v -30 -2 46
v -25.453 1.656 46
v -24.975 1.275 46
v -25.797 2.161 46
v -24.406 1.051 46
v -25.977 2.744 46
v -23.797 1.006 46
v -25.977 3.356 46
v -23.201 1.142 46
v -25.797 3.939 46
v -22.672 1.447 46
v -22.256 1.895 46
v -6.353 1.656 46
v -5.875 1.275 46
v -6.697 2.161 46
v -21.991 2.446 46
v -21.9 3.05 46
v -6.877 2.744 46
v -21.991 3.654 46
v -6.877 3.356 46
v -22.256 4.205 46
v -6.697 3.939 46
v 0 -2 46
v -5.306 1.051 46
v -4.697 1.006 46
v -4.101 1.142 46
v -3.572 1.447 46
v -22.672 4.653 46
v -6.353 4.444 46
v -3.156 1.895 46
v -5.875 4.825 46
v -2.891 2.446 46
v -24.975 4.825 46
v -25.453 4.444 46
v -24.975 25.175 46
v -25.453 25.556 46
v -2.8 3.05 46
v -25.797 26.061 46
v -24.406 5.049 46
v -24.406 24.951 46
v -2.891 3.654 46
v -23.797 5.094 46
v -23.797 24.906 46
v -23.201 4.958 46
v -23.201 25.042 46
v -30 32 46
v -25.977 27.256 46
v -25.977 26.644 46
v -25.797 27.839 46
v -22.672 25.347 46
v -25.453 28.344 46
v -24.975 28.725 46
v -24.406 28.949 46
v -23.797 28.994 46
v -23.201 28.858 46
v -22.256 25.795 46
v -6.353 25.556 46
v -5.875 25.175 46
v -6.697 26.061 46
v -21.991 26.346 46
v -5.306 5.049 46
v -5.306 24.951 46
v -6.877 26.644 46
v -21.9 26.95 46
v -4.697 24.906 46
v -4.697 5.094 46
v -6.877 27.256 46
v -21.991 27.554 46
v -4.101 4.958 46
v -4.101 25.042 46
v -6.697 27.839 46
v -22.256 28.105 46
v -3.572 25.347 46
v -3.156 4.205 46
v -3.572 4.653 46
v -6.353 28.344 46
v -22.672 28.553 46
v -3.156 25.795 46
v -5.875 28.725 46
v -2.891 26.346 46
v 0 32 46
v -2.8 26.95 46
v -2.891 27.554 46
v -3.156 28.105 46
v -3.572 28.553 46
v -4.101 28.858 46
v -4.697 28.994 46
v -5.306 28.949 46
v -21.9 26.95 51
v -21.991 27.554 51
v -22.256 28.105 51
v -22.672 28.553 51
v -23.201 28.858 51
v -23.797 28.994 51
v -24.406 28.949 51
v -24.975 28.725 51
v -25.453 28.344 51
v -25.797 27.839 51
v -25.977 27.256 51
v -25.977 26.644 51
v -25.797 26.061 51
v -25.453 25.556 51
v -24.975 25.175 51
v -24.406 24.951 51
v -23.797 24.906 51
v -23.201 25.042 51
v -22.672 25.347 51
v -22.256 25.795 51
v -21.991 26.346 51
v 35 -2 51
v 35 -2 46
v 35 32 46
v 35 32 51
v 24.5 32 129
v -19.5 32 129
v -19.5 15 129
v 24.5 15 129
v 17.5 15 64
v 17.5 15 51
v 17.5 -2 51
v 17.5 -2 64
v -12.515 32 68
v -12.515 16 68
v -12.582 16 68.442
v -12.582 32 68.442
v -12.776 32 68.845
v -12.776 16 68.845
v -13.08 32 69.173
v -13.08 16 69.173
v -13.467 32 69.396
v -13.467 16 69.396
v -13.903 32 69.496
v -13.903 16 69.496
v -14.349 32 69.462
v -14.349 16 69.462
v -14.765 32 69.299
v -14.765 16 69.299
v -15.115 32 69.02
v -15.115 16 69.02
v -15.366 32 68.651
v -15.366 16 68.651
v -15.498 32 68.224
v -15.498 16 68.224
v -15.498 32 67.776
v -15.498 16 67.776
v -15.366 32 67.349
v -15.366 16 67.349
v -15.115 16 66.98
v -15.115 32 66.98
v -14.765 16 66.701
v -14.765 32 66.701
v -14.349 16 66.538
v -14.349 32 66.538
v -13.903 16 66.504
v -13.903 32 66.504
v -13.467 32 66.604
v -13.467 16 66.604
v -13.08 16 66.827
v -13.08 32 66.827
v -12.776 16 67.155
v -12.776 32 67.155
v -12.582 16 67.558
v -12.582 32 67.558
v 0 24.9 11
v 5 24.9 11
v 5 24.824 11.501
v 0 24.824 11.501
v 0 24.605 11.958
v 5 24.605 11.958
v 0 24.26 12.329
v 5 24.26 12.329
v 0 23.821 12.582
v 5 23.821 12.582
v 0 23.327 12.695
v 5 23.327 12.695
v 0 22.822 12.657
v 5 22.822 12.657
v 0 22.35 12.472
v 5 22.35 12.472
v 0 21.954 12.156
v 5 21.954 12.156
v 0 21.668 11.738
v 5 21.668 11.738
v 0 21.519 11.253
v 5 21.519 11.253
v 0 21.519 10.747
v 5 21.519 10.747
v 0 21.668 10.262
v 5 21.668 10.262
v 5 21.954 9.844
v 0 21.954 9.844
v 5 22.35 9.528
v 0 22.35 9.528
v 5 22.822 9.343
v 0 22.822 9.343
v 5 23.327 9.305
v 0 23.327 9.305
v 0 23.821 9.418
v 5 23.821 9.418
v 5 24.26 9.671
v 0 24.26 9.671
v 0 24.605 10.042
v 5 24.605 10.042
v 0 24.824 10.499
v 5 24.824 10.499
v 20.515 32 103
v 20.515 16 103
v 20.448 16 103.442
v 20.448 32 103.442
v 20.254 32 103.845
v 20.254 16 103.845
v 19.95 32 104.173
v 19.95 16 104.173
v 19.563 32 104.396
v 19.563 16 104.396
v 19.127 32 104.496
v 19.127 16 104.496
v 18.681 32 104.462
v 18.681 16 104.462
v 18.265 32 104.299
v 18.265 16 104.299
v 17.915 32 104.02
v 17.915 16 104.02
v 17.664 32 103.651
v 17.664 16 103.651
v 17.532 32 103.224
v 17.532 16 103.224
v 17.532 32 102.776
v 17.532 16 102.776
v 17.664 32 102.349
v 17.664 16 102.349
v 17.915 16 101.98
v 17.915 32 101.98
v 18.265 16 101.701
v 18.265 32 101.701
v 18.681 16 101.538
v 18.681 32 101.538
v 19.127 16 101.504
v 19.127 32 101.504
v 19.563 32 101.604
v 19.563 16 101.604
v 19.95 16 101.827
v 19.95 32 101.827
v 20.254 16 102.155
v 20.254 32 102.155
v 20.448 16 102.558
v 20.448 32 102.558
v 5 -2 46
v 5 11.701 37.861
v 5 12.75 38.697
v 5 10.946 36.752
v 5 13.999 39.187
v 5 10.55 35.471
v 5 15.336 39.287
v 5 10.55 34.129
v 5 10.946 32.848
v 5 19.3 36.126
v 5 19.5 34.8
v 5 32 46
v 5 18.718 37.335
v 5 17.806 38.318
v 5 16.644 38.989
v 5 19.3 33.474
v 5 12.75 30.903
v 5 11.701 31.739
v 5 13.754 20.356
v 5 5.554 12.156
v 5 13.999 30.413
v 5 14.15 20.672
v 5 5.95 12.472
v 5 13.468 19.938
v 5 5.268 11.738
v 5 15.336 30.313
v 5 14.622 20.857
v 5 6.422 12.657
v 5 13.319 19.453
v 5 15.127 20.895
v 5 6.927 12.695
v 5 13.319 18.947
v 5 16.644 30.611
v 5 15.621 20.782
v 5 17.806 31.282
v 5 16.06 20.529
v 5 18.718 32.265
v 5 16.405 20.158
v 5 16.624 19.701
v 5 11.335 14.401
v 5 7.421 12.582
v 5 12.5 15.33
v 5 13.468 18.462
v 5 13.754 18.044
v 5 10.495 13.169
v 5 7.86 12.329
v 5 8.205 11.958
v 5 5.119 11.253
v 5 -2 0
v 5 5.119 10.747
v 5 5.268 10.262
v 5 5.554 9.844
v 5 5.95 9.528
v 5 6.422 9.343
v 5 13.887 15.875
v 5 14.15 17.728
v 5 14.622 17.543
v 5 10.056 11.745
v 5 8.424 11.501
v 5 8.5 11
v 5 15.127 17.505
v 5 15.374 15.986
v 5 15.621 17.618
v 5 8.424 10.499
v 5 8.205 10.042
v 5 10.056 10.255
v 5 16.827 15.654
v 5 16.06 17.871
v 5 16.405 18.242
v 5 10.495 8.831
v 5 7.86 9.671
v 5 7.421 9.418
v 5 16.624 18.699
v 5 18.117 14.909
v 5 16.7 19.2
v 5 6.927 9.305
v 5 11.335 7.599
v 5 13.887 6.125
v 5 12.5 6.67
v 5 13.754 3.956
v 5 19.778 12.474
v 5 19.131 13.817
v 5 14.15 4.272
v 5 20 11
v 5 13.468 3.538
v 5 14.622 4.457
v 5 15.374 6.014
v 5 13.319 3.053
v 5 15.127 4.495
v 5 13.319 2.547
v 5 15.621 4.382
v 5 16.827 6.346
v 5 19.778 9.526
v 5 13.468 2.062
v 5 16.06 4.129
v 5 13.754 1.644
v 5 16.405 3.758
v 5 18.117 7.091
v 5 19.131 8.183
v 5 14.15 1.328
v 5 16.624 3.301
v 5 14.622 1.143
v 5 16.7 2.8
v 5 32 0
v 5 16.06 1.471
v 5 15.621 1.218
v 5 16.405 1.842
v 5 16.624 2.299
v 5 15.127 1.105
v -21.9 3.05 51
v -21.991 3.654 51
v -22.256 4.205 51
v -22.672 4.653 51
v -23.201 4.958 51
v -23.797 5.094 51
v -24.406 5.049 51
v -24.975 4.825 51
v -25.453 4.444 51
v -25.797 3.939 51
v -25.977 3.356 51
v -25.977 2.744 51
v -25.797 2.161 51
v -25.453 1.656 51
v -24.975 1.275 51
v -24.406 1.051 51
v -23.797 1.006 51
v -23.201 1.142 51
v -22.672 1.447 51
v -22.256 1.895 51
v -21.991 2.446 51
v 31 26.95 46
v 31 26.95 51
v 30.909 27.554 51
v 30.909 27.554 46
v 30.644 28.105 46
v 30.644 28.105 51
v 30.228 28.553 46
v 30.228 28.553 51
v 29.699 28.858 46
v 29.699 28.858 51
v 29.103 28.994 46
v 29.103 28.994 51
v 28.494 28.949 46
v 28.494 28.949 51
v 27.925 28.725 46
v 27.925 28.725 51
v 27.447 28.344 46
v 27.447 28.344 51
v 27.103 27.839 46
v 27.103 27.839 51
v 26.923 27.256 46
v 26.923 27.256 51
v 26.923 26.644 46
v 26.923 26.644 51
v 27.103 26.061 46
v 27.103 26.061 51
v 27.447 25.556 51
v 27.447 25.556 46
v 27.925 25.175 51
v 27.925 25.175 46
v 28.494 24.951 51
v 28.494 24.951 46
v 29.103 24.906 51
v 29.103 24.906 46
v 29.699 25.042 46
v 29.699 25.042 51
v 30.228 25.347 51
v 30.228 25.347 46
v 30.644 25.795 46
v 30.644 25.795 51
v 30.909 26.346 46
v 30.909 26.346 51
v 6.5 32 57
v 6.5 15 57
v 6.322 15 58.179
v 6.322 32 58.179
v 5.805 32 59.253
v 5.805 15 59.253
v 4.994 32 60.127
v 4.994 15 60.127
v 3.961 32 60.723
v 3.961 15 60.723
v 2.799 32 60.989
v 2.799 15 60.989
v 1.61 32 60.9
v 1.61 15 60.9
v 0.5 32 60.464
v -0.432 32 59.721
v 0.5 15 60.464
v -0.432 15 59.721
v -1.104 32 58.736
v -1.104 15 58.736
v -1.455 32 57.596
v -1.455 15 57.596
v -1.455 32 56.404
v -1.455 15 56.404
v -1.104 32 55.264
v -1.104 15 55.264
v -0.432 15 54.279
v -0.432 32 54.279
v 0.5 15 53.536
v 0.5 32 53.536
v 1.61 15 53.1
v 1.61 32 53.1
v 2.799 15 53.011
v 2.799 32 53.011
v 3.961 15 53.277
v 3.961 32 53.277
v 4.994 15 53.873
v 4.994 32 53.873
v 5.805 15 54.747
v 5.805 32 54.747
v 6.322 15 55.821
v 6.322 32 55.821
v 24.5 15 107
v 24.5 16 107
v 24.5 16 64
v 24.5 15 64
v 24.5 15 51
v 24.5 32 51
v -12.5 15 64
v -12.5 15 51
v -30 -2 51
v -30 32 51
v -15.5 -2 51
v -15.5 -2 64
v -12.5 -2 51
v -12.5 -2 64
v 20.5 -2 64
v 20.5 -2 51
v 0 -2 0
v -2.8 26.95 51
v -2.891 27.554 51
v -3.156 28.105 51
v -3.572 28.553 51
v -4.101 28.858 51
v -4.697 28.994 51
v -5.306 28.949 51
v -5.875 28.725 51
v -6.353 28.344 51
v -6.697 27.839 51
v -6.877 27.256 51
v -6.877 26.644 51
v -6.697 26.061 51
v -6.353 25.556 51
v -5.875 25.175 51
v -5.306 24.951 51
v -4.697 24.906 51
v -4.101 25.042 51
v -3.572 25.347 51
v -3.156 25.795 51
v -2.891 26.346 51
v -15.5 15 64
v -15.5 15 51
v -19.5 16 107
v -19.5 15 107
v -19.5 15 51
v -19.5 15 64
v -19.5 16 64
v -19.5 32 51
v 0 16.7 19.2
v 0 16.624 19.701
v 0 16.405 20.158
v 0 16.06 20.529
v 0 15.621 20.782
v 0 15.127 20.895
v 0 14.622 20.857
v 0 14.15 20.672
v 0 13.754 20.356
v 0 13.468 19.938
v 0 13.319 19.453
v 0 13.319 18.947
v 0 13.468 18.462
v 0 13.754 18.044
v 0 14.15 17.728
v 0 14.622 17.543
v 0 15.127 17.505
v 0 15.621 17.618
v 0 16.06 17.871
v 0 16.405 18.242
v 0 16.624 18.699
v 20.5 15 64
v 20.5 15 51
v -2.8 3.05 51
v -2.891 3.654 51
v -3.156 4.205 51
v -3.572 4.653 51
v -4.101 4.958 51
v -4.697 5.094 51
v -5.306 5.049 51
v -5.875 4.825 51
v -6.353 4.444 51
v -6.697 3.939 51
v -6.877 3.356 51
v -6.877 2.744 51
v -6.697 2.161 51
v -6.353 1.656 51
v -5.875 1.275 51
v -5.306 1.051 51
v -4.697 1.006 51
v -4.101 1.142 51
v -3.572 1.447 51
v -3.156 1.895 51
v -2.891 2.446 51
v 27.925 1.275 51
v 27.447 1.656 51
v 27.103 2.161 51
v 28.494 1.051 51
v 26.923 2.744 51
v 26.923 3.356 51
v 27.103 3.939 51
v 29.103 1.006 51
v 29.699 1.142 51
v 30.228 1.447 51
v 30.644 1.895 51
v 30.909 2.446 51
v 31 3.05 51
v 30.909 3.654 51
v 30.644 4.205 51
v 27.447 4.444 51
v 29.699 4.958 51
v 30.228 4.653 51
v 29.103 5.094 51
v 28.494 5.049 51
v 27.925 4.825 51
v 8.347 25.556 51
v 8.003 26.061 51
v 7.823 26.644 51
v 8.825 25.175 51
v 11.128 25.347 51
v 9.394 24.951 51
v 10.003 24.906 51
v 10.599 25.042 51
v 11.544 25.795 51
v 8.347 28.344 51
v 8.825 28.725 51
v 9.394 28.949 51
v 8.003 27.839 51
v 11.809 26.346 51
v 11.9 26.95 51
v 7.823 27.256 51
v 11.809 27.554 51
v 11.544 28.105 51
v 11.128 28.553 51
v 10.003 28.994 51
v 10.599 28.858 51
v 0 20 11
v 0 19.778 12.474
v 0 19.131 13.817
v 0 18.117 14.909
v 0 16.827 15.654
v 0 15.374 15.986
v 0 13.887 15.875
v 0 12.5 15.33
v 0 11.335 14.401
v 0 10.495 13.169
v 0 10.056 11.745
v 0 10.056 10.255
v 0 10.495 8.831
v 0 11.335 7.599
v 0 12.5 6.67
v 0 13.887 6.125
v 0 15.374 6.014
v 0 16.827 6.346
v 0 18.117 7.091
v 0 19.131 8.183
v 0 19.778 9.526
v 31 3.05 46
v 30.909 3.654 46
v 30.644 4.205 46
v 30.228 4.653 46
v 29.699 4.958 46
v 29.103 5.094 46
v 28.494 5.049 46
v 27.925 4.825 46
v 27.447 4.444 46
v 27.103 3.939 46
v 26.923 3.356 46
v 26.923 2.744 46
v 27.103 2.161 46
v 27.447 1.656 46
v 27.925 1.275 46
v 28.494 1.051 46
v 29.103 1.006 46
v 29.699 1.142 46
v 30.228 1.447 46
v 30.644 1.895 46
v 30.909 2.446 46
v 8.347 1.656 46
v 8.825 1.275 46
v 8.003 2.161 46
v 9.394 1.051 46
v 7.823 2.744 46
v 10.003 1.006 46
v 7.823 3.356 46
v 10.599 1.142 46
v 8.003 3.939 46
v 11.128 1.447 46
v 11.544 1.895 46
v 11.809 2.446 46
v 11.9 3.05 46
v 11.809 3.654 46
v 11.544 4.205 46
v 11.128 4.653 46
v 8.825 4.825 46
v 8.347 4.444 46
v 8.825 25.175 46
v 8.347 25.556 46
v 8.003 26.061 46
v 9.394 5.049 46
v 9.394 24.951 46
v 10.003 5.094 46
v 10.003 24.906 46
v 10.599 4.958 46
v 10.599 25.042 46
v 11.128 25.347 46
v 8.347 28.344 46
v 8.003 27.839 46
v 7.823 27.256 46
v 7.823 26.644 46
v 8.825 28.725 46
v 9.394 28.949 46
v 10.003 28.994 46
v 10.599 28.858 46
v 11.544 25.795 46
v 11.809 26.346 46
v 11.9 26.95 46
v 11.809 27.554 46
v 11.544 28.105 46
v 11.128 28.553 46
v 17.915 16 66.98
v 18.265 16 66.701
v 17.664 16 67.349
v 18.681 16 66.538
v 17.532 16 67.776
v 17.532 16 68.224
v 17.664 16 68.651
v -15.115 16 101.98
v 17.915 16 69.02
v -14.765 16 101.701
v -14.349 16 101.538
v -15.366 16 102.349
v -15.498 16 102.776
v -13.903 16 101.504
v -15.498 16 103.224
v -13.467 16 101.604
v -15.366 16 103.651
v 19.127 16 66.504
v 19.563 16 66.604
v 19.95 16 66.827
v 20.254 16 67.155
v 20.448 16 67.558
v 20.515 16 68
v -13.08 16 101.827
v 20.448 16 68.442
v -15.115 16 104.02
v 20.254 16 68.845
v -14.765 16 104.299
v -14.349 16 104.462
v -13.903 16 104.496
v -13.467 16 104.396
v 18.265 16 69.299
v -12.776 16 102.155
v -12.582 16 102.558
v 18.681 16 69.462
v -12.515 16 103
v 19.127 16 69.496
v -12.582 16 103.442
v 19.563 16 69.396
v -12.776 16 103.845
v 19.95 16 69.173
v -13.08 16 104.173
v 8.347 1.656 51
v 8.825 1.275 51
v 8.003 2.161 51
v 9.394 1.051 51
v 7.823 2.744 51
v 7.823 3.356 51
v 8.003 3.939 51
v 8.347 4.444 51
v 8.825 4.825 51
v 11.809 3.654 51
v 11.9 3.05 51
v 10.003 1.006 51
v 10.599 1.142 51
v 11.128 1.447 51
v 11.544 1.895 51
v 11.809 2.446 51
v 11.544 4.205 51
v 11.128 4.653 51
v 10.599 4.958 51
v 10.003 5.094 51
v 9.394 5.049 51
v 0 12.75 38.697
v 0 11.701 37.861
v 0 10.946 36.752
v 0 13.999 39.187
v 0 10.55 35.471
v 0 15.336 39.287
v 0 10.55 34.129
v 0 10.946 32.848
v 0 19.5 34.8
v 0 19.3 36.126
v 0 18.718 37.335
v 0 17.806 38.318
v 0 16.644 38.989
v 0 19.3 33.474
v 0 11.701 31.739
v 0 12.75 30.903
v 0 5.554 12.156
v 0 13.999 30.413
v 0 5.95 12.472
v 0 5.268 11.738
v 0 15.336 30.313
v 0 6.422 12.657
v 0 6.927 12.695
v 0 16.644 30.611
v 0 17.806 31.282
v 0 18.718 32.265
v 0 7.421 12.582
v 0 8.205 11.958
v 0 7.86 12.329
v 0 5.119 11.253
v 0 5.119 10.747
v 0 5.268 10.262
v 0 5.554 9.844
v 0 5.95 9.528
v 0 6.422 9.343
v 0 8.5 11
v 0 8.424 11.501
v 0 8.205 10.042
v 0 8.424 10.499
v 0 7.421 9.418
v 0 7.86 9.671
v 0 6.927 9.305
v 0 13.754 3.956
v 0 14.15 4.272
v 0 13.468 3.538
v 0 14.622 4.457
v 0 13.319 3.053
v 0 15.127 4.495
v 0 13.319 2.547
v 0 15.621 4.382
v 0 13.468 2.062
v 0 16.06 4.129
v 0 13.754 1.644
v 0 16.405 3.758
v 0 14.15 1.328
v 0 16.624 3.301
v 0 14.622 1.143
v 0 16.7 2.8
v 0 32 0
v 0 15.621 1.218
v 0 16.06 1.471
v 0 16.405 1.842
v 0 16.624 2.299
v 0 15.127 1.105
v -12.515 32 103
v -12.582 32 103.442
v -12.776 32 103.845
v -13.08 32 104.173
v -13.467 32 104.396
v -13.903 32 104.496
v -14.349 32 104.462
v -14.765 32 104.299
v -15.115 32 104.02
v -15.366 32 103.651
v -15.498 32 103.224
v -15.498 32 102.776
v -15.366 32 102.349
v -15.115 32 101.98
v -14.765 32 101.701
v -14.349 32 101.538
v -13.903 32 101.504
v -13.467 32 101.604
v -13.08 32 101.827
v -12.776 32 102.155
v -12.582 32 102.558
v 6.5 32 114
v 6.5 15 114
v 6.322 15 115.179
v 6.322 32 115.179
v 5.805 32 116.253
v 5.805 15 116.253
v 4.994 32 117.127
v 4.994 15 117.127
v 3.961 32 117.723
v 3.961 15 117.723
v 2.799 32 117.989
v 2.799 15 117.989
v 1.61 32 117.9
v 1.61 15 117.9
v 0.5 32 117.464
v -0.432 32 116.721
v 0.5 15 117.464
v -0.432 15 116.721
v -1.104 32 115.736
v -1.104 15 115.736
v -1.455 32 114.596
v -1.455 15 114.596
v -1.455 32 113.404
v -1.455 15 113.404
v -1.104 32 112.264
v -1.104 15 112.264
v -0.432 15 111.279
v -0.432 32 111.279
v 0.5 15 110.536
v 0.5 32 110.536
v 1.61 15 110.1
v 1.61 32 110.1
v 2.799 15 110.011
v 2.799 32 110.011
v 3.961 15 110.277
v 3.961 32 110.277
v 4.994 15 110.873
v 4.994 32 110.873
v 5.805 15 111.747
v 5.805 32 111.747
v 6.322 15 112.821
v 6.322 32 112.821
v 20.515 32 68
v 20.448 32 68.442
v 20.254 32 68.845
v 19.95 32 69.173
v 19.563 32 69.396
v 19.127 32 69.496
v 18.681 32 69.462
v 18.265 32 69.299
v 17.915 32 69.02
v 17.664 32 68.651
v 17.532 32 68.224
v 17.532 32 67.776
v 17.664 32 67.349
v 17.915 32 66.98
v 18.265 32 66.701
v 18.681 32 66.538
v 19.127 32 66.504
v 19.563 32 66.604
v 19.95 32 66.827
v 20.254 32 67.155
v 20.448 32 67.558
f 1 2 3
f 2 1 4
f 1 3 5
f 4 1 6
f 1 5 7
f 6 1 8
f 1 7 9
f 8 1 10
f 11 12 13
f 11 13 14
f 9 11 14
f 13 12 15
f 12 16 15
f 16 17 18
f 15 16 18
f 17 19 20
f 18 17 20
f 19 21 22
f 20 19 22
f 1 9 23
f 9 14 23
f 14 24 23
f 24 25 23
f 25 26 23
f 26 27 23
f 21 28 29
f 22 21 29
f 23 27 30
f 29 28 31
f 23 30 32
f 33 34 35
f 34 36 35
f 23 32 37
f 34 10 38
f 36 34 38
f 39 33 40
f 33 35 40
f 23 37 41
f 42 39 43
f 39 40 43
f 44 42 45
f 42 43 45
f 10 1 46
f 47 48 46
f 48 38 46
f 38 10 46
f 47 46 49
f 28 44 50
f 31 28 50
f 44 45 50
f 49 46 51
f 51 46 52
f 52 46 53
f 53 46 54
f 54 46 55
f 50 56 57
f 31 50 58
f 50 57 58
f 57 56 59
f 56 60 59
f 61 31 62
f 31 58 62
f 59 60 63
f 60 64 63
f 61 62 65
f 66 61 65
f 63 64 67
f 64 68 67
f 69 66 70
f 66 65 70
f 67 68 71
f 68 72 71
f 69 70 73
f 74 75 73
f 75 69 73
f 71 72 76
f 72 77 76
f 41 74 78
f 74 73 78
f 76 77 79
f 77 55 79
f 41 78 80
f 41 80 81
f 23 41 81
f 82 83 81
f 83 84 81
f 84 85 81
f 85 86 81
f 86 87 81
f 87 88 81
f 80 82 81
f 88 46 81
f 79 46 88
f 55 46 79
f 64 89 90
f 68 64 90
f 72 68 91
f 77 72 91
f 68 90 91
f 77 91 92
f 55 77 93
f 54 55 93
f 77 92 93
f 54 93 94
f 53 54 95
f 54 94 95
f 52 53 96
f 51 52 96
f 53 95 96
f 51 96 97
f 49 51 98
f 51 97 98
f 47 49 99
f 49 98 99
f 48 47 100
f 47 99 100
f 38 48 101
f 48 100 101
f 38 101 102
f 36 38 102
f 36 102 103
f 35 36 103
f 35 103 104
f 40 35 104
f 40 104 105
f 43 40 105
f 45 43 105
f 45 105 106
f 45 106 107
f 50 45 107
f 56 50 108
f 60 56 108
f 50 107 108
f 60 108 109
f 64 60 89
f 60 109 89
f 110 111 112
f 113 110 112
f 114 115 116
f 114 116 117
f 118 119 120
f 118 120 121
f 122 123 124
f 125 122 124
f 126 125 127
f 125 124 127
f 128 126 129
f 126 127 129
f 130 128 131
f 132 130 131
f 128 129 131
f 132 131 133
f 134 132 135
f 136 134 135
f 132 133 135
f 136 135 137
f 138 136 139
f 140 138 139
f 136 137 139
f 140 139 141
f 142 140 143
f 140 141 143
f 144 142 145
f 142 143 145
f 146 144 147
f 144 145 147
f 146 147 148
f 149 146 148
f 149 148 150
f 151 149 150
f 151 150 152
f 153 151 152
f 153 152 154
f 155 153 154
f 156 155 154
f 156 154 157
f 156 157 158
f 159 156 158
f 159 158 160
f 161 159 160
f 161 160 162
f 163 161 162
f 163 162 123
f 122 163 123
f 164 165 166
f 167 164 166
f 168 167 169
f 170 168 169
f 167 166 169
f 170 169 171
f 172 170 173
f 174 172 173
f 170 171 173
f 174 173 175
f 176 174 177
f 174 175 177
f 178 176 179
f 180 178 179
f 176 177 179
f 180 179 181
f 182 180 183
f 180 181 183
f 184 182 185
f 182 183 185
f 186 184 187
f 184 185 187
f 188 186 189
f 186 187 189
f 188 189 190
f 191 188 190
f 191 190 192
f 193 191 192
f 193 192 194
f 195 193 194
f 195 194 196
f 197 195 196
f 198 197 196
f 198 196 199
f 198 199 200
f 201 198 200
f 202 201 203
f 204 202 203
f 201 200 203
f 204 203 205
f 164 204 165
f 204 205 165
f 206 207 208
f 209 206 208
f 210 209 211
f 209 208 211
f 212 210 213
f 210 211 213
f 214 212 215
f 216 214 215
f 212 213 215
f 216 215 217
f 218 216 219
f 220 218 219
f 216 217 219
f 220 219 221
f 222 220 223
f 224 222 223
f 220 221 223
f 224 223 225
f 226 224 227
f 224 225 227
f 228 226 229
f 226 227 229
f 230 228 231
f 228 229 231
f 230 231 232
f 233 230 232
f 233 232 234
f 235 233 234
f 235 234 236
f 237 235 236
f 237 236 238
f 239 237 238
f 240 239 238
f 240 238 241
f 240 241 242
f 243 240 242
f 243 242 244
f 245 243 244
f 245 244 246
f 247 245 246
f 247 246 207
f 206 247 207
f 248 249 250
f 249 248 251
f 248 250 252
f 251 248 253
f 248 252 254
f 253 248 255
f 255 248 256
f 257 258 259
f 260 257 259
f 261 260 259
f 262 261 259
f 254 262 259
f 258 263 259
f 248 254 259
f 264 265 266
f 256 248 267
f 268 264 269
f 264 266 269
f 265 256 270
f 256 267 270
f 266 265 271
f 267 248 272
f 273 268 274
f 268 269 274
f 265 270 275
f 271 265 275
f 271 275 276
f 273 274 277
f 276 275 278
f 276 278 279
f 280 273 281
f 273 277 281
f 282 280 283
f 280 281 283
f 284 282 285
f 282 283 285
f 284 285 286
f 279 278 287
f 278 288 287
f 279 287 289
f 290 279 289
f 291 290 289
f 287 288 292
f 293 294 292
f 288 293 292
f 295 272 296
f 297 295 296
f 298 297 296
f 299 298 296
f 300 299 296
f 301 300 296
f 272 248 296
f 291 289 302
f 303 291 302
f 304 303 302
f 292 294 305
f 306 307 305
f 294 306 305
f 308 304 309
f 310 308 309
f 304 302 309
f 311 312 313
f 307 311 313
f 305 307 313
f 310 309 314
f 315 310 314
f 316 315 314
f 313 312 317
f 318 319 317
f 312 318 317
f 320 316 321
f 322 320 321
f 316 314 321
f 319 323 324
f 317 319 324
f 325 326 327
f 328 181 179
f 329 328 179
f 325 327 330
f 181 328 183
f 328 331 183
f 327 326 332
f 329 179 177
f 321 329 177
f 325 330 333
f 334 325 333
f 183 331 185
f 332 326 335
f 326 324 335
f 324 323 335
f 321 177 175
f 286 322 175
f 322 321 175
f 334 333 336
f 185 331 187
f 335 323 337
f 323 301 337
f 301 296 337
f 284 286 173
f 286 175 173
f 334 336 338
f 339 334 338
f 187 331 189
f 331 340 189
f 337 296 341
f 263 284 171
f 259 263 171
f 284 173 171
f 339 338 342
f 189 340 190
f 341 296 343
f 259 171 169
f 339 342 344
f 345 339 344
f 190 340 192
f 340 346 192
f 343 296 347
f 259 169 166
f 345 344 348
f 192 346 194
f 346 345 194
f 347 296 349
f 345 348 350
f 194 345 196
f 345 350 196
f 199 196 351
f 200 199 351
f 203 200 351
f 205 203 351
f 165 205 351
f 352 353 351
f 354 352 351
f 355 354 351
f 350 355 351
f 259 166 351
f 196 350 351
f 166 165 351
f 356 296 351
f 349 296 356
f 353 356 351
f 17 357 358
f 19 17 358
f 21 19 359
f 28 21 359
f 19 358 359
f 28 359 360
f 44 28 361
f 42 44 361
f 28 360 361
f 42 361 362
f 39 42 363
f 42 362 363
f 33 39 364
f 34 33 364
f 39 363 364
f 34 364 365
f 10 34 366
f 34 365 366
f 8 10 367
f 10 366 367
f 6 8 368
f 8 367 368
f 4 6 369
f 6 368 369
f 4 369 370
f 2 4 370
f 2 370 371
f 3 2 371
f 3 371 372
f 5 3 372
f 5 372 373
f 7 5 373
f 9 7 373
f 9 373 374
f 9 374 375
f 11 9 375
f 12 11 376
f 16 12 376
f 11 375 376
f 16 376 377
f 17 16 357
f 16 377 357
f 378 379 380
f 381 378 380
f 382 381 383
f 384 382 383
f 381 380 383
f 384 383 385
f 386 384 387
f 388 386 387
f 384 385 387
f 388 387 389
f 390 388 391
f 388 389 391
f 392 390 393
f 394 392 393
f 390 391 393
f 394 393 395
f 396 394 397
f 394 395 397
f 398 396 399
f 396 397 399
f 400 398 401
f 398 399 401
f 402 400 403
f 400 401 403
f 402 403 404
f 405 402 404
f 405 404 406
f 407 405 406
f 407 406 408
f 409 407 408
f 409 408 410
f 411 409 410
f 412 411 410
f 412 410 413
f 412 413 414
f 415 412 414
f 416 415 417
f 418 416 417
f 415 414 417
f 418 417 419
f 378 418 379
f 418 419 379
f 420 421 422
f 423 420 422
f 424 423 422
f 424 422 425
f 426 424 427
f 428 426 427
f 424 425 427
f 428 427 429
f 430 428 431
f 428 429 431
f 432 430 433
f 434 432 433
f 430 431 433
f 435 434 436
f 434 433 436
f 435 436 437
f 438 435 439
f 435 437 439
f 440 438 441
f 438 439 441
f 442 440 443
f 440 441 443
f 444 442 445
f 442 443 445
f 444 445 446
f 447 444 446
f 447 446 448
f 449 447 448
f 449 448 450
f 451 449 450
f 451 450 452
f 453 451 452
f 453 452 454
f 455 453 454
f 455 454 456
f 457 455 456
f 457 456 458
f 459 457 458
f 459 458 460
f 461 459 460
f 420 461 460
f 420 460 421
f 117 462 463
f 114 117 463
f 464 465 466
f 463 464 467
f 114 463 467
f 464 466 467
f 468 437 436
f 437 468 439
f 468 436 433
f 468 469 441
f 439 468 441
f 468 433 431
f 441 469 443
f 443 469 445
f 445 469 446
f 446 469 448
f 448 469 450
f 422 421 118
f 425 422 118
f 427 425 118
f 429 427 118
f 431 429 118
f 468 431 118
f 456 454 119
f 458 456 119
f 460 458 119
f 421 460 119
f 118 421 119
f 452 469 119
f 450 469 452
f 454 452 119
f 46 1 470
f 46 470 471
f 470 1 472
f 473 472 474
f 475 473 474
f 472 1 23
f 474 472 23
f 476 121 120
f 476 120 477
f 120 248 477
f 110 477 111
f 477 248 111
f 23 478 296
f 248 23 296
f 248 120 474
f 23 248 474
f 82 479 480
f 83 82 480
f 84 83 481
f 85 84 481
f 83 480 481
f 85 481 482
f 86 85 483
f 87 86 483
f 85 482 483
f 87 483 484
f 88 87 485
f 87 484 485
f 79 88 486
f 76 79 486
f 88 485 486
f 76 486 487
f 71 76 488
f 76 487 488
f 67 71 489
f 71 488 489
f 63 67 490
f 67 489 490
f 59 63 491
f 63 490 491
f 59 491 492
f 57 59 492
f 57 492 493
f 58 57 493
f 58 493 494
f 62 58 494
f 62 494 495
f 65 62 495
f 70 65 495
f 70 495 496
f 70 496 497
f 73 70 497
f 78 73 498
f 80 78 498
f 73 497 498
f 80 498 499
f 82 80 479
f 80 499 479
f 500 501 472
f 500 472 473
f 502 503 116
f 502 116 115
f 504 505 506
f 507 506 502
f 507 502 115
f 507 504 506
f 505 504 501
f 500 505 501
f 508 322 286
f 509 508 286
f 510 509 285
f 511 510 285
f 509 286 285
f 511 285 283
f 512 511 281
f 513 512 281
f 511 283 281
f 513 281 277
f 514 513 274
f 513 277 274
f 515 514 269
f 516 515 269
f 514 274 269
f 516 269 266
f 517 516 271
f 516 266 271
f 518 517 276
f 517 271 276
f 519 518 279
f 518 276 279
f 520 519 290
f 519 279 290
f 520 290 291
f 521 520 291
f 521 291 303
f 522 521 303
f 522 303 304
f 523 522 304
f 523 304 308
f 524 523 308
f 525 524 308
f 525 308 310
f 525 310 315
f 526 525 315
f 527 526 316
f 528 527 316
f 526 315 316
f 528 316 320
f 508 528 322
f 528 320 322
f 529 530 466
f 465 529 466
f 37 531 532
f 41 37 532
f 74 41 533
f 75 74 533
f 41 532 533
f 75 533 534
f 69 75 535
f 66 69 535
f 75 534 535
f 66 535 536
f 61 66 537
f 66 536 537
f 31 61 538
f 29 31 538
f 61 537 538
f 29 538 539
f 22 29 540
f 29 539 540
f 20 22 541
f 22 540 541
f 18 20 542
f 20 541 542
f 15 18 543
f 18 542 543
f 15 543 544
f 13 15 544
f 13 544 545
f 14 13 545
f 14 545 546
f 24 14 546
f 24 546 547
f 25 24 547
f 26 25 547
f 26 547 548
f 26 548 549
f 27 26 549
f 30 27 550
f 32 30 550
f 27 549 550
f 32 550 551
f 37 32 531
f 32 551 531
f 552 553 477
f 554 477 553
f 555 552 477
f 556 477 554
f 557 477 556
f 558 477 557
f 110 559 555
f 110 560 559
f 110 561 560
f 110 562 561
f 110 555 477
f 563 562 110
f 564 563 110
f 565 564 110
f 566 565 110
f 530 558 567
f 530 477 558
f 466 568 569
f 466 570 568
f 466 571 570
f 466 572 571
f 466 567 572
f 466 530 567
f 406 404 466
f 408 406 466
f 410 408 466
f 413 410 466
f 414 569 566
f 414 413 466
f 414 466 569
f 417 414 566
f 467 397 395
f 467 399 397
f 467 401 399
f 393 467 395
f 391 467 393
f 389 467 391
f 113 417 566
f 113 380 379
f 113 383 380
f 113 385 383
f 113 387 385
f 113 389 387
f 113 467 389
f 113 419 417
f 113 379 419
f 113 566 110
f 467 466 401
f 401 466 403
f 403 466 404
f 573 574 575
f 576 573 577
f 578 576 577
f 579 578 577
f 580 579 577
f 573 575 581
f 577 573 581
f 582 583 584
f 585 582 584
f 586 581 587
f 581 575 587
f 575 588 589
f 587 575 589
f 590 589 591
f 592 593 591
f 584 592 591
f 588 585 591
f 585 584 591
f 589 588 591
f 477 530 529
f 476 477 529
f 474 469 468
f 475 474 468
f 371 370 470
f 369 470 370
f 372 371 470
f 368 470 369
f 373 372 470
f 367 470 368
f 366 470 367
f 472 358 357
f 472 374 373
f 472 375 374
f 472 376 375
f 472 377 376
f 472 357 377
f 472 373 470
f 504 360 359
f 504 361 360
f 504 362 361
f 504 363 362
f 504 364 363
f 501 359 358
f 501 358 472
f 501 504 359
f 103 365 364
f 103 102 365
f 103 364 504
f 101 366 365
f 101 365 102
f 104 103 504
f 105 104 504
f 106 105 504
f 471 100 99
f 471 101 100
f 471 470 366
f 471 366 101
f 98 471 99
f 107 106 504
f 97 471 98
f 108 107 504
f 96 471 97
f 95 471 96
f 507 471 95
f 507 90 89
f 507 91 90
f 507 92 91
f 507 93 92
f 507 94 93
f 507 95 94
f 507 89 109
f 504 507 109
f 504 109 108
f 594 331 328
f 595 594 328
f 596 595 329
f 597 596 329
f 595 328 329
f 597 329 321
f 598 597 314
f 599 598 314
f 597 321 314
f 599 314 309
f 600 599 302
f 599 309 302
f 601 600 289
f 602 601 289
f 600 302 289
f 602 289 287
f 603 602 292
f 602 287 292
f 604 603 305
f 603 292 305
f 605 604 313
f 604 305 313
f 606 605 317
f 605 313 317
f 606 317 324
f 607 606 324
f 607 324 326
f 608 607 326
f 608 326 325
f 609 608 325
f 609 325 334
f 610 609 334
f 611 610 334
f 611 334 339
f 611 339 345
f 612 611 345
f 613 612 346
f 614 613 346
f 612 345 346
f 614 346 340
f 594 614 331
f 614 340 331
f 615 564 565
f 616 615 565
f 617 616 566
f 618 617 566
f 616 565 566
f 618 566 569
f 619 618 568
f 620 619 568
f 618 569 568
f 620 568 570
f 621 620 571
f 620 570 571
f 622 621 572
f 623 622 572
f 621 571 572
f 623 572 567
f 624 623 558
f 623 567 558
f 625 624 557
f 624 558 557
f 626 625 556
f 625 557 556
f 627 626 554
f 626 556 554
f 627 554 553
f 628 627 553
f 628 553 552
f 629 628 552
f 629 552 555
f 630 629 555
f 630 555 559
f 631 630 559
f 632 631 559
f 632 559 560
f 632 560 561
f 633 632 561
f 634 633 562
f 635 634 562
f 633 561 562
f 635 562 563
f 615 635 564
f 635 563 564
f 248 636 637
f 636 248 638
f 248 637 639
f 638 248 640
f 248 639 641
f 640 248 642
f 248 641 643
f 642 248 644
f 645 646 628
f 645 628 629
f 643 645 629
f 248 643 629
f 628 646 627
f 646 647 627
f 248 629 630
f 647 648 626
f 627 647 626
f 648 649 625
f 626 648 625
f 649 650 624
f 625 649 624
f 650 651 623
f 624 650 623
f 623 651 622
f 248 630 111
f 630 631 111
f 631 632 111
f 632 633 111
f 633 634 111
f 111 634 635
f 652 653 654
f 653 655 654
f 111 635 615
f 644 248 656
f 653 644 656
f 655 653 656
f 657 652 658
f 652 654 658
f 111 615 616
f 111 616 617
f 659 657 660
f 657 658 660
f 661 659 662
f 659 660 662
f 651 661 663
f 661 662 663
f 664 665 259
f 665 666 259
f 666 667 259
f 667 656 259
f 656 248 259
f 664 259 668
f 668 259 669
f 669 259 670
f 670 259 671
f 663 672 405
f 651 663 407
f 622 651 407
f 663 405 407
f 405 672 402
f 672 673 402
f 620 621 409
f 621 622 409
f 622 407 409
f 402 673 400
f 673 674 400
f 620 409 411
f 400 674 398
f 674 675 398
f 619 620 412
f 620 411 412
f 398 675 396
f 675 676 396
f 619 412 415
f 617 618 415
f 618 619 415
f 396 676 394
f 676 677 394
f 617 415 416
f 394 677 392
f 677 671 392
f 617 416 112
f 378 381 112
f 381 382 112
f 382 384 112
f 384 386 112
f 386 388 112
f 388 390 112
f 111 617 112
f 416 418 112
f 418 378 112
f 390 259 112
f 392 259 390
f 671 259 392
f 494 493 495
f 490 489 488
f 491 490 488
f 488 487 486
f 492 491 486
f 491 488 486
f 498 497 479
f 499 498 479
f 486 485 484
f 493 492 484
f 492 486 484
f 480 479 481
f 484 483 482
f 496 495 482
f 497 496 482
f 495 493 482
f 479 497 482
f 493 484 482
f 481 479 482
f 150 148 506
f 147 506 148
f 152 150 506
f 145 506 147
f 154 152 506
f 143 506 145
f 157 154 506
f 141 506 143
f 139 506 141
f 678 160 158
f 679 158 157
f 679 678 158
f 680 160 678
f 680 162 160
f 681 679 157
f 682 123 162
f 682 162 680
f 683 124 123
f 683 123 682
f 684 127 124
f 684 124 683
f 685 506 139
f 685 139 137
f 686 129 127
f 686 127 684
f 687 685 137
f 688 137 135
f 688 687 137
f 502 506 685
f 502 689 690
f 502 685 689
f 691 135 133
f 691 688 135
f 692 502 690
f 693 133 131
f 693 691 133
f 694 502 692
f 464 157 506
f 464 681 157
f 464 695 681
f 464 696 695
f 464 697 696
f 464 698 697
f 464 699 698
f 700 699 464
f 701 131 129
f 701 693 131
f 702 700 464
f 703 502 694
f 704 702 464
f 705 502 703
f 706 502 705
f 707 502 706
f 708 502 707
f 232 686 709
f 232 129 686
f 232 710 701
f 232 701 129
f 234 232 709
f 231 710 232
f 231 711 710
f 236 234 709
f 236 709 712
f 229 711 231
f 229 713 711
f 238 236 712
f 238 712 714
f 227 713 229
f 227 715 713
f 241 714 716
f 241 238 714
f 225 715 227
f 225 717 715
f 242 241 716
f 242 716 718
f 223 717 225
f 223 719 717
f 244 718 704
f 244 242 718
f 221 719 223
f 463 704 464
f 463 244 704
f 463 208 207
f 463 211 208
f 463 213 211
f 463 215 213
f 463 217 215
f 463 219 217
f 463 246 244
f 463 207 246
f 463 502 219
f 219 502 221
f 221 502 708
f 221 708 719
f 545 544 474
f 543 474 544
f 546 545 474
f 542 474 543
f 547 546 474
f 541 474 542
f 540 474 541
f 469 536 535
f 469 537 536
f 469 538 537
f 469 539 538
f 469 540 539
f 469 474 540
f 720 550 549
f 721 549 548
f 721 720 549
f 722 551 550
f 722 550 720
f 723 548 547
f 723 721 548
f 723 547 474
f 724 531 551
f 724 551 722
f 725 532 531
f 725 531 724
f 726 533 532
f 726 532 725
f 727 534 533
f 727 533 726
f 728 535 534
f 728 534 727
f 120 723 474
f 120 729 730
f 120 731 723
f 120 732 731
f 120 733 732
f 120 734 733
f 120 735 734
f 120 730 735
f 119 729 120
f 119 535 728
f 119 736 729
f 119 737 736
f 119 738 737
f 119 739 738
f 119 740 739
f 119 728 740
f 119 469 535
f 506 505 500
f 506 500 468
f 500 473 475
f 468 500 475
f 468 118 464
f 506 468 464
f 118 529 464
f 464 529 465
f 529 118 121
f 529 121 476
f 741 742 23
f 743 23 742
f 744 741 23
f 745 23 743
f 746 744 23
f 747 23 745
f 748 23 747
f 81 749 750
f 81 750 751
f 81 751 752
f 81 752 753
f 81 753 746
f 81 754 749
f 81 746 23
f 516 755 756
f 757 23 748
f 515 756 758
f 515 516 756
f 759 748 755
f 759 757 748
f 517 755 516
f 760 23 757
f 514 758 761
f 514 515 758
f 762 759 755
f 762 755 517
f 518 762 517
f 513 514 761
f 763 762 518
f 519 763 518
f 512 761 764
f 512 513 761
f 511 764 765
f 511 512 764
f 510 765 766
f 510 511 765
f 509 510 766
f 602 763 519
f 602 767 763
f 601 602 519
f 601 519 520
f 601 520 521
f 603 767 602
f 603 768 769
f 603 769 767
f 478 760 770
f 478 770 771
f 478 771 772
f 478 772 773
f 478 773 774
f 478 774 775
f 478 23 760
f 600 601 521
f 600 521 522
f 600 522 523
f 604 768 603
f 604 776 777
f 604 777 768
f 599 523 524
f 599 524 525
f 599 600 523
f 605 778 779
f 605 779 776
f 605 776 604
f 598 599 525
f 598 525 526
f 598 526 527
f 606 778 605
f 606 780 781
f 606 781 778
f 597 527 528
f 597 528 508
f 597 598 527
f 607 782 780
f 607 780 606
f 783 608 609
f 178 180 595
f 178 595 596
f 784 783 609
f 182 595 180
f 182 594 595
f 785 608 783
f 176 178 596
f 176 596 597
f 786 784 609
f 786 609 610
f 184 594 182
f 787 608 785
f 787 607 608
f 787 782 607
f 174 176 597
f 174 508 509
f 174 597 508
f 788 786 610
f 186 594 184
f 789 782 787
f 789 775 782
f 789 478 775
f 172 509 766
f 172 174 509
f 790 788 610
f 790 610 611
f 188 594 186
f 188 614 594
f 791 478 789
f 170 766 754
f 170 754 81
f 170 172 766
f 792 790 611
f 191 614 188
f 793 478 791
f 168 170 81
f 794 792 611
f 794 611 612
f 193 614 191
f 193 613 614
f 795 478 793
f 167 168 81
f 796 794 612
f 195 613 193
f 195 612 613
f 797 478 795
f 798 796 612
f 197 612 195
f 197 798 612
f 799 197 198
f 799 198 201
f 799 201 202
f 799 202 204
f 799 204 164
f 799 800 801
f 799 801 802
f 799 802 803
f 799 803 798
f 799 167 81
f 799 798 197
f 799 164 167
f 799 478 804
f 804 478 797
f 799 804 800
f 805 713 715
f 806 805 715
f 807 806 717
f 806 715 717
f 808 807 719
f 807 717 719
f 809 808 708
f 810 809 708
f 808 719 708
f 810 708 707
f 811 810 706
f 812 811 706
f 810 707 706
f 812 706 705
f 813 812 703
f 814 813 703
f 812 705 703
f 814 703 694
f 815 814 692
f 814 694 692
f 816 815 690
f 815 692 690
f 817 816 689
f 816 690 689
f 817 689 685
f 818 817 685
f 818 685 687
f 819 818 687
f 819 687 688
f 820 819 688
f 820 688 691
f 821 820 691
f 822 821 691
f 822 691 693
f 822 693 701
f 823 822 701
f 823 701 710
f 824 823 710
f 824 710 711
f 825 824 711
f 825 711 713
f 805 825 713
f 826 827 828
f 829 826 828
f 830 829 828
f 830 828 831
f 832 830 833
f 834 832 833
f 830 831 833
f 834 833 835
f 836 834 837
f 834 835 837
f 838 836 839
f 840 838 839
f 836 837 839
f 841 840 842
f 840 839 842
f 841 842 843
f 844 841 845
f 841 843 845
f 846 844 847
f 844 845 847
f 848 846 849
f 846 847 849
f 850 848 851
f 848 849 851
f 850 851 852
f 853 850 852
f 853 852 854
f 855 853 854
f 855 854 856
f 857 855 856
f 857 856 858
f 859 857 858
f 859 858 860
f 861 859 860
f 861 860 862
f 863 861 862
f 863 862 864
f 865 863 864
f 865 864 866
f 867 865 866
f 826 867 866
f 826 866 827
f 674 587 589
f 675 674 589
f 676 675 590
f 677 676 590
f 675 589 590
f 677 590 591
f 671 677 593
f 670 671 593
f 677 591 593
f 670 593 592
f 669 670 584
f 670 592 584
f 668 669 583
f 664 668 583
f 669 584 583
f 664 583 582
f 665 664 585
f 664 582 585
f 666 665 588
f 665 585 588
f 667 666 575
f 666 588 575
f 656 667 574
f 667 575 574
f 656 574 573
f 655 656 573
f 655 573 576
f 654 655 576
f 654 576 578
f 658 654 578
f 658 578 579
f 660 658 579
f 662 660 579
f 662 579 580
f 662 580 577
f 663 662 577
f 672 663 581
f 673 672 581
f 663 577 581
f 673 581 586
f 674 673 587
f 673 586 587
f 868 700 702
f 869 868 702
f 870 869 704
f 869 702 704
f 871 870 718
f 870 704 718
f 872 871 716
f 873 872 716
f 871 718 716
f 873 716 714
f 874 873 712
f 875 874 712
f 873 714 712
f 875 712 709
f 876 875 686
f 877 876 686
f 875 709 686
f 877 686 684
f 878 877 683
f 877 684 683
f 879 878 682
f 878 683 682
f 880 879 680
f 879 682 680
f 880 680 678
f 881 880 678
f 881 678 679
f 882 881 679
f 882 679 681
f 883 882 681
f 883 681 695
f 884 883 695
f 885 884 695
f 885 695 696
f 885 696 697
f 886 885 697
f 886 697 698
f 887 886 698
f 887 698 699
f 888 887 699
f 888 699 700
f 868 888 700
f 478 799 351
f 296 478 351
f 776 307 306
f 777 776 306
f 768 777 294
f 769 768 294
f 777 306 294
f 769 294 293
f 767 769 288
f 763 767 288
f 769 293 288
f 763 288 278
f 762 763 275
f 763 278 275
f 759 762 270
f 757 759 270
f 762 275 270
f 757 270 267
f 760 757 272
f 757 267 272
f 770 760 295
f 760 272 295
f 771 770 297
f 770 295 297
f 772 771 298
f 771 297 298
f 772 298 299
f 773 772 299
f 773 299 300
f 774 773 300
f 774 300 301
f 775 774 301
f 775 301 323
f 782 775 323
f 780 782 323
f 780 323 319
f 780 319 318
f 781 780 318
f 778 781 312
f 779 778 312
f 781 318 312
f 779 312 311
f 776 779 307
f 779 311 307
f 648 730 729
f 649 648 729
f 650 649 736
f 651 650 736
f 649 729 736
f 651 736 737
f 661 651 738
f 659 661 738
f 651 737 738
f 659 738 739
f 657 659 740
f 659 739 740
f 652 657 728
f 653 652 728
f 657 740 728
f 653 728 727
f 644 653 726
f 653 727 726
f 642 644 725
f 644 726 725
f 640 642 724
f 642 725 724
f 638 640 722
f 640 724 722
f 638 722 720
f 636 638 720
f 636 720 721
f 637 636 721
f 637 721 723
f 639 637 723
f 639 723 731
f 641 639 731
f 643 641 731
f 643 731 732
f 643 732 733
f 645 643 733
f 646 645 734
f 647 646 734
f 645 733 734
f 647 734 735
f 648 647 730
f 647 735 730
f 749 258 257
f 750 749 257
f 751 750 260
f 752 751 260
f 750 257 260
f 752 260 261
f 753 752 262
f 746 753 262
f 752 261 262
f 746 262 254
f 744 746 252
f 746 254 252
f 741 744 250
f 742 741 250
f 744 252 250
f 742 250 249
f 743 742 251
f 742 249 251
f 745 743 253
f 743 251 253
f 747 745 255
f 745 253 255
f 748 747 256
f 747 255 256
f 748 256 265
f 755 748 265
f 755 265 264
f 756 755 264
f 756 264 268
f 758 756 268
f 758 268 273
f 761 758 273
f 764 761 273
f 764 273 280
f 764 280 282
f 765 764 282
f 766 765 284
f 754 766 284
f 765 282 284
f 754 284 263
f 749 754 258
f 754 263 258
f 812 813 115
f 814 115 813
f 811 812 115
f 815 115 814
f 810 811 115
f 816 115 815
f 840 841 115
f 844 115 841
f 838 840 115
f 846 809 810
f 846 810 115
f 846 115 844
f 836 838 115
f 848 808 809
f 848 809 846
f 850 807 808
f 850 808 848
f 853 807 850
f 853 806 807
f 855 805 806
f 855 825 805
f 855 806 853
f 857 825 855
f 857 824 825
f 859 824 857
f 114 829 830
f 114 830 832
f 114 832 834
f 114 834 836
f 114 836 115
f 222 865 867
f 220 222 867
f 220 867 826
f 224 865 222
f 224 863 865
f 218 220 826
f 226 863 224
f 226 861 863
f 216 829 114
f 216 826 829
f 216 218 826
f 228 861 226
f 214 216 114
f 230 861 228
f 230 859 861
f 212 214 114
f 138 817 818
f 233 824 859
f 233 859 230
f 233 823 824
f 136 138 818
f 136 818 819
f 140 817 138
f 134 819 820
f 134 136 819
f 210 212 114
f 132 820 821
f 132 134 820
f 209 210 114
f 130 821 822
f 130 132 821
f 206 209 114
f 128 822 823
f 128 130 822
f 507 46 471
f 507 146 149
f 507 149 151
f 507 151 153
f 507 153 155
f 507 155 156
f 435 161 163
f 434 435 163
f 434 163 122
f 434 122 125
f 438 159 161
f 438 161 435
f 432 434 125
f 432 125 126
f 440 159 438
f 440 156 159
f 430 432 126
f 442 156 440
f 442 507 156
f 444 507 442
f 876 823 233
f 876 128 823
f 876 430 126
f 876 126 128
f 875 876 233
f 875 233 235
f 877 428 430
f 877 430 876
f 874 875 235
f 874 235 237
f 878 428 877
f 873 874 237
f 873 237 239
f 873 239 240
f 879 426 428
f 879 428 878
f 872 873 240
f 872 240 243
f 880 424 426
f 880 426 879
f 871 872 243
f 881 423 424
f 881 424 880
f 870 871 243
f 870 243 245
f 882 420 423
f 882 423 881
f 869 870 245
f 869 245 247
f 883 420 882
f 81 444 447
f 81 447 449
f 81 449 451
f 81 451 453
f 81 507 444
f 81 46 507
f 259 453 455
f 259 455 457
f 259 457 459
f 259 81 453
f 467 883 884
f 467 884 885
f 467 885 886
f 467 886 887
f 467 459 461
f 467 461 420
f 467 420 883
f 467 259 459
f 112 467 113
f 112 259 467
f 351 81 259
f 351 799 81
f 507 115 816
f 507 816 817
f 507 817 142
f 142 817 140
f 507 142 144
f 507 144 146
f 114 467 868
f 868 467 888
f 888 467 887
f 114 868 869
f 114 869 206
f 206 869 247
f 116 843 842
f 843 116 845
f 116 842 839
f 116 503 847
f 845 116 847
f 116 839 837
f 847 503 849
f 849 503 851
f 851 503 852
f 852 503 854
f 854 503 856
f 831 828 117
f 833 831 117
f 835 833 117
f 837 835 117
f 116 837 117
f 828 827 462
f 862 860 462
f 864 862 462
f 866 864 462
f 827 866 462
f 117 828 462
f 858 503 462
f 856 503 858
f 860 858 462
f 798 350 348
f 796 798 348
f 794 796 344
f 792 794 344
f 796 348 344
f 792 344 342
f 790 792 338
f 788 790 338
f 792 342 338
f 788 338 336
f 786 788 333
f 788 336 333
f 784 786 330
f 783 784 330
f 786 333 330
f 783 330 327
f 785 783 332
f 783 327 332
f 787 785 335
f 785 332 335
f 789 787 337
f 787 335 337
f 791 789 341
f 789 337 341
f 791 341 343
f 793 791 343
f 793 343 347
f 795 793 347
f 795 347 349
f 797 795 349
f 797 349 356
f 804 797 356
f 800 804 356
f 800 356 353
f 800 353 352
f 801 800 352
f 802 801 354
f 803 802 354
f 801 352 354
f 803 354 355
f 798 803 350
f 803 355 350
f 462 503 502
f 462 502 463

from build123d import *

# Parameters (mm, degrees)
BOX001_W        = 65
BOX001_H        = 34
BOX001_DEPTH    = 5
BOX_W           = 5
BOX_H           = 34
BOX_DEPTH       = 46
SKETCH_R        = 2.05
POCKET_DEPTH    = 5
SKETCH001_R     = 5
SKETCH001_R_2   = 1.7
POCKET001_DEPTH = 5
SKETCH002_R     = 4.5
POCKET002_DEPTH = 5
BOX002_W        = 44
BOX002_H        = 17
BOX002_DEPTH    = 78
SKETCH003_R     = 4
SKETCH003_R_2   = 1.5
POCKET003_DEPTH = 17.001
SKETCH004_W     = 44
SKETCH004_H     = 43
POCKET004_DEPTH = 1
SKETCH005_W     = 3
SKETCH005_H     = 13
PAD_DEPTH       = 17


with BuildPart() as cubo001:
    # Box001 → Box001 (new body)
    with BuildSketch(Plane(origin=(-30, -2, 46), x_dir=(1, 0, 0), z_dir=(0, 0, 1))):
        with Locations((32.5, 17)):
            Rectangle(BOX001_W, BOX001_H)
    extrude(amount=BOX001_DEPTH)


with BuildPart() as pocket002:
    # Box → Box (new body)
    with BuildSketch(Plane(origin=(0, -2, 0), x_dir=(1, 0, 0), z_dir=(0, 0, 1))):
        with Locations((2.5, 17)):
            Rectangle(BOX_W, BOX_H)
    extrude(amount=BOX_DEPTH)

    # Fusion: union Cubo001
    add(cubo001.part)

    # Sketch → Pocket (cut)
    with BuildSketch(Plane.XY.offset(51)):
        with Locations((-36.05, -7.05)):
            Circle(SKETCH_R)
        with Locations((28.95, 3.05)):
            Circle(SKETCH_R)
        with Locations((-55.15, -7.05)):
            Circle(SKETCH_R)
        with Locations((9.85, 3.05)):
            Circle(SKETCH_R)
        with Locations((-4.85, 3.05)):
            Circle(SKETCH_R)
        with Locations((-23.95, 3.05)):
            Circle(SKETCH_R)
        with Locations((-23.95, 26.95)):
            Circle(SKETCH_R)
        with Locations((-4.85, 26.95)):
            Circle(SKETCH_R)
        with Locations((9.85, 26.95)):
            Circle(SKETCH_R)
        with Locations((28.95, 26.95)):
            Circle(SKETCH_R)
    extrude(amount=-POCKET_DEPTH, mode=Mode.SUBTRACT)

    # Sketch001 → Pocket001 (cut)
    with BuildSketch(Plane.YZ.offset(5)):
        with Locations((15, 11)):
            Circle(SKETCH001_R)
        with Locations((15, 19.2)):
            Circle(SKETCH001_R_2)
        with Locations((23.2, 11)):
            Circle(SKETCH001_R_2)
        with Locations((15, 2.8)):
            Circle(SKETCH001_R_2)
        with Locations((6.8, 11)):
            Circle(SKETCH001_R_2)
    extrude(amount=-POCKET001_DEPTH, mode=Mode.SUBTRACT)

    # Sketch002 → Pocket002 (cut)
    with BuildSketch(Plane.YZ.offset(5)):
        with Locations((15, 34.8)):
            Circle(SKETCH002_R)
    extrude(amount=-POCKET002_DEPTH, mode=Mode.SUBTRACT)


with BuildPart() as fusion001002:
    # Box002 → Box002 (new body)
    with BuildSketch(Plane(origin=(-19.5, 15, 51), x_dir=(1, 0, 0), z_dir=(0, 0, 1))):
        with Locations((22, 8.5)):
            Rectangle(BOX002_W, BOX002_H)
    extrude(amount=BOX002_DEPTH)

    # Sketch003 → Pocket003 (cut, through all)
    with BuildSketch(Plane(origin=(-19.5, 15, 51), x_dir=(1, 0, 0), z_dir=(0, -1, 0))):
        with Locations((22, 6)):
            Circle(SKETCH003_R)
        with Locations((22, 63)):
            Circle(SKETCH003_R)
        with Locations((5.485017, 17)):
            Circle(SKETCH003_R_2)
        with Locations((38.514983, 17)):
            Circle(SKETCH003_R_2)
        with Locations((5.485017, 52)):
            Circle(SKETCH003_R_2)
        with Locations((38.514983, 52)):
            Circle(SKETCH003_R_2)
    extrude(amount=-POCKET003_DEPTH, mode=Mode.SUBTRACT)

    # Sketch004 → Pocket004 (cut)
    with BuildSketch(Plane(origin=(-19.5, 15, 51), x_dir=(1, 0, 0), z_dir=(0, -1, 0))):
        with Locations((22, 34.5)):
            Rectangle(SKETCH004_W, SKETCH004_H)
    extrude(amount=-POCKET004_DEPTH, mode=Mode.SUBTRACT)

    # Sketch005 → Pad (new body)
    with BuildSketch(Plane(origin=(-19.5, 15, 51), x_dir=(1, 0, 0), z_dir=(0, -1, 0))):
        with Locations((38.5, 6.5)):
            Rectangle(SKETCH005_W, SKETCH005_H)
        with Locations((5.5, 6.5)):
            Rectangle(SKETCH005_W, SKETCH005_H)
    extrude(amount=PAD_DEPTH)

    # Fusion001002: union Pocket002
    add(pocket002.part)


solid = fusion001002.part
